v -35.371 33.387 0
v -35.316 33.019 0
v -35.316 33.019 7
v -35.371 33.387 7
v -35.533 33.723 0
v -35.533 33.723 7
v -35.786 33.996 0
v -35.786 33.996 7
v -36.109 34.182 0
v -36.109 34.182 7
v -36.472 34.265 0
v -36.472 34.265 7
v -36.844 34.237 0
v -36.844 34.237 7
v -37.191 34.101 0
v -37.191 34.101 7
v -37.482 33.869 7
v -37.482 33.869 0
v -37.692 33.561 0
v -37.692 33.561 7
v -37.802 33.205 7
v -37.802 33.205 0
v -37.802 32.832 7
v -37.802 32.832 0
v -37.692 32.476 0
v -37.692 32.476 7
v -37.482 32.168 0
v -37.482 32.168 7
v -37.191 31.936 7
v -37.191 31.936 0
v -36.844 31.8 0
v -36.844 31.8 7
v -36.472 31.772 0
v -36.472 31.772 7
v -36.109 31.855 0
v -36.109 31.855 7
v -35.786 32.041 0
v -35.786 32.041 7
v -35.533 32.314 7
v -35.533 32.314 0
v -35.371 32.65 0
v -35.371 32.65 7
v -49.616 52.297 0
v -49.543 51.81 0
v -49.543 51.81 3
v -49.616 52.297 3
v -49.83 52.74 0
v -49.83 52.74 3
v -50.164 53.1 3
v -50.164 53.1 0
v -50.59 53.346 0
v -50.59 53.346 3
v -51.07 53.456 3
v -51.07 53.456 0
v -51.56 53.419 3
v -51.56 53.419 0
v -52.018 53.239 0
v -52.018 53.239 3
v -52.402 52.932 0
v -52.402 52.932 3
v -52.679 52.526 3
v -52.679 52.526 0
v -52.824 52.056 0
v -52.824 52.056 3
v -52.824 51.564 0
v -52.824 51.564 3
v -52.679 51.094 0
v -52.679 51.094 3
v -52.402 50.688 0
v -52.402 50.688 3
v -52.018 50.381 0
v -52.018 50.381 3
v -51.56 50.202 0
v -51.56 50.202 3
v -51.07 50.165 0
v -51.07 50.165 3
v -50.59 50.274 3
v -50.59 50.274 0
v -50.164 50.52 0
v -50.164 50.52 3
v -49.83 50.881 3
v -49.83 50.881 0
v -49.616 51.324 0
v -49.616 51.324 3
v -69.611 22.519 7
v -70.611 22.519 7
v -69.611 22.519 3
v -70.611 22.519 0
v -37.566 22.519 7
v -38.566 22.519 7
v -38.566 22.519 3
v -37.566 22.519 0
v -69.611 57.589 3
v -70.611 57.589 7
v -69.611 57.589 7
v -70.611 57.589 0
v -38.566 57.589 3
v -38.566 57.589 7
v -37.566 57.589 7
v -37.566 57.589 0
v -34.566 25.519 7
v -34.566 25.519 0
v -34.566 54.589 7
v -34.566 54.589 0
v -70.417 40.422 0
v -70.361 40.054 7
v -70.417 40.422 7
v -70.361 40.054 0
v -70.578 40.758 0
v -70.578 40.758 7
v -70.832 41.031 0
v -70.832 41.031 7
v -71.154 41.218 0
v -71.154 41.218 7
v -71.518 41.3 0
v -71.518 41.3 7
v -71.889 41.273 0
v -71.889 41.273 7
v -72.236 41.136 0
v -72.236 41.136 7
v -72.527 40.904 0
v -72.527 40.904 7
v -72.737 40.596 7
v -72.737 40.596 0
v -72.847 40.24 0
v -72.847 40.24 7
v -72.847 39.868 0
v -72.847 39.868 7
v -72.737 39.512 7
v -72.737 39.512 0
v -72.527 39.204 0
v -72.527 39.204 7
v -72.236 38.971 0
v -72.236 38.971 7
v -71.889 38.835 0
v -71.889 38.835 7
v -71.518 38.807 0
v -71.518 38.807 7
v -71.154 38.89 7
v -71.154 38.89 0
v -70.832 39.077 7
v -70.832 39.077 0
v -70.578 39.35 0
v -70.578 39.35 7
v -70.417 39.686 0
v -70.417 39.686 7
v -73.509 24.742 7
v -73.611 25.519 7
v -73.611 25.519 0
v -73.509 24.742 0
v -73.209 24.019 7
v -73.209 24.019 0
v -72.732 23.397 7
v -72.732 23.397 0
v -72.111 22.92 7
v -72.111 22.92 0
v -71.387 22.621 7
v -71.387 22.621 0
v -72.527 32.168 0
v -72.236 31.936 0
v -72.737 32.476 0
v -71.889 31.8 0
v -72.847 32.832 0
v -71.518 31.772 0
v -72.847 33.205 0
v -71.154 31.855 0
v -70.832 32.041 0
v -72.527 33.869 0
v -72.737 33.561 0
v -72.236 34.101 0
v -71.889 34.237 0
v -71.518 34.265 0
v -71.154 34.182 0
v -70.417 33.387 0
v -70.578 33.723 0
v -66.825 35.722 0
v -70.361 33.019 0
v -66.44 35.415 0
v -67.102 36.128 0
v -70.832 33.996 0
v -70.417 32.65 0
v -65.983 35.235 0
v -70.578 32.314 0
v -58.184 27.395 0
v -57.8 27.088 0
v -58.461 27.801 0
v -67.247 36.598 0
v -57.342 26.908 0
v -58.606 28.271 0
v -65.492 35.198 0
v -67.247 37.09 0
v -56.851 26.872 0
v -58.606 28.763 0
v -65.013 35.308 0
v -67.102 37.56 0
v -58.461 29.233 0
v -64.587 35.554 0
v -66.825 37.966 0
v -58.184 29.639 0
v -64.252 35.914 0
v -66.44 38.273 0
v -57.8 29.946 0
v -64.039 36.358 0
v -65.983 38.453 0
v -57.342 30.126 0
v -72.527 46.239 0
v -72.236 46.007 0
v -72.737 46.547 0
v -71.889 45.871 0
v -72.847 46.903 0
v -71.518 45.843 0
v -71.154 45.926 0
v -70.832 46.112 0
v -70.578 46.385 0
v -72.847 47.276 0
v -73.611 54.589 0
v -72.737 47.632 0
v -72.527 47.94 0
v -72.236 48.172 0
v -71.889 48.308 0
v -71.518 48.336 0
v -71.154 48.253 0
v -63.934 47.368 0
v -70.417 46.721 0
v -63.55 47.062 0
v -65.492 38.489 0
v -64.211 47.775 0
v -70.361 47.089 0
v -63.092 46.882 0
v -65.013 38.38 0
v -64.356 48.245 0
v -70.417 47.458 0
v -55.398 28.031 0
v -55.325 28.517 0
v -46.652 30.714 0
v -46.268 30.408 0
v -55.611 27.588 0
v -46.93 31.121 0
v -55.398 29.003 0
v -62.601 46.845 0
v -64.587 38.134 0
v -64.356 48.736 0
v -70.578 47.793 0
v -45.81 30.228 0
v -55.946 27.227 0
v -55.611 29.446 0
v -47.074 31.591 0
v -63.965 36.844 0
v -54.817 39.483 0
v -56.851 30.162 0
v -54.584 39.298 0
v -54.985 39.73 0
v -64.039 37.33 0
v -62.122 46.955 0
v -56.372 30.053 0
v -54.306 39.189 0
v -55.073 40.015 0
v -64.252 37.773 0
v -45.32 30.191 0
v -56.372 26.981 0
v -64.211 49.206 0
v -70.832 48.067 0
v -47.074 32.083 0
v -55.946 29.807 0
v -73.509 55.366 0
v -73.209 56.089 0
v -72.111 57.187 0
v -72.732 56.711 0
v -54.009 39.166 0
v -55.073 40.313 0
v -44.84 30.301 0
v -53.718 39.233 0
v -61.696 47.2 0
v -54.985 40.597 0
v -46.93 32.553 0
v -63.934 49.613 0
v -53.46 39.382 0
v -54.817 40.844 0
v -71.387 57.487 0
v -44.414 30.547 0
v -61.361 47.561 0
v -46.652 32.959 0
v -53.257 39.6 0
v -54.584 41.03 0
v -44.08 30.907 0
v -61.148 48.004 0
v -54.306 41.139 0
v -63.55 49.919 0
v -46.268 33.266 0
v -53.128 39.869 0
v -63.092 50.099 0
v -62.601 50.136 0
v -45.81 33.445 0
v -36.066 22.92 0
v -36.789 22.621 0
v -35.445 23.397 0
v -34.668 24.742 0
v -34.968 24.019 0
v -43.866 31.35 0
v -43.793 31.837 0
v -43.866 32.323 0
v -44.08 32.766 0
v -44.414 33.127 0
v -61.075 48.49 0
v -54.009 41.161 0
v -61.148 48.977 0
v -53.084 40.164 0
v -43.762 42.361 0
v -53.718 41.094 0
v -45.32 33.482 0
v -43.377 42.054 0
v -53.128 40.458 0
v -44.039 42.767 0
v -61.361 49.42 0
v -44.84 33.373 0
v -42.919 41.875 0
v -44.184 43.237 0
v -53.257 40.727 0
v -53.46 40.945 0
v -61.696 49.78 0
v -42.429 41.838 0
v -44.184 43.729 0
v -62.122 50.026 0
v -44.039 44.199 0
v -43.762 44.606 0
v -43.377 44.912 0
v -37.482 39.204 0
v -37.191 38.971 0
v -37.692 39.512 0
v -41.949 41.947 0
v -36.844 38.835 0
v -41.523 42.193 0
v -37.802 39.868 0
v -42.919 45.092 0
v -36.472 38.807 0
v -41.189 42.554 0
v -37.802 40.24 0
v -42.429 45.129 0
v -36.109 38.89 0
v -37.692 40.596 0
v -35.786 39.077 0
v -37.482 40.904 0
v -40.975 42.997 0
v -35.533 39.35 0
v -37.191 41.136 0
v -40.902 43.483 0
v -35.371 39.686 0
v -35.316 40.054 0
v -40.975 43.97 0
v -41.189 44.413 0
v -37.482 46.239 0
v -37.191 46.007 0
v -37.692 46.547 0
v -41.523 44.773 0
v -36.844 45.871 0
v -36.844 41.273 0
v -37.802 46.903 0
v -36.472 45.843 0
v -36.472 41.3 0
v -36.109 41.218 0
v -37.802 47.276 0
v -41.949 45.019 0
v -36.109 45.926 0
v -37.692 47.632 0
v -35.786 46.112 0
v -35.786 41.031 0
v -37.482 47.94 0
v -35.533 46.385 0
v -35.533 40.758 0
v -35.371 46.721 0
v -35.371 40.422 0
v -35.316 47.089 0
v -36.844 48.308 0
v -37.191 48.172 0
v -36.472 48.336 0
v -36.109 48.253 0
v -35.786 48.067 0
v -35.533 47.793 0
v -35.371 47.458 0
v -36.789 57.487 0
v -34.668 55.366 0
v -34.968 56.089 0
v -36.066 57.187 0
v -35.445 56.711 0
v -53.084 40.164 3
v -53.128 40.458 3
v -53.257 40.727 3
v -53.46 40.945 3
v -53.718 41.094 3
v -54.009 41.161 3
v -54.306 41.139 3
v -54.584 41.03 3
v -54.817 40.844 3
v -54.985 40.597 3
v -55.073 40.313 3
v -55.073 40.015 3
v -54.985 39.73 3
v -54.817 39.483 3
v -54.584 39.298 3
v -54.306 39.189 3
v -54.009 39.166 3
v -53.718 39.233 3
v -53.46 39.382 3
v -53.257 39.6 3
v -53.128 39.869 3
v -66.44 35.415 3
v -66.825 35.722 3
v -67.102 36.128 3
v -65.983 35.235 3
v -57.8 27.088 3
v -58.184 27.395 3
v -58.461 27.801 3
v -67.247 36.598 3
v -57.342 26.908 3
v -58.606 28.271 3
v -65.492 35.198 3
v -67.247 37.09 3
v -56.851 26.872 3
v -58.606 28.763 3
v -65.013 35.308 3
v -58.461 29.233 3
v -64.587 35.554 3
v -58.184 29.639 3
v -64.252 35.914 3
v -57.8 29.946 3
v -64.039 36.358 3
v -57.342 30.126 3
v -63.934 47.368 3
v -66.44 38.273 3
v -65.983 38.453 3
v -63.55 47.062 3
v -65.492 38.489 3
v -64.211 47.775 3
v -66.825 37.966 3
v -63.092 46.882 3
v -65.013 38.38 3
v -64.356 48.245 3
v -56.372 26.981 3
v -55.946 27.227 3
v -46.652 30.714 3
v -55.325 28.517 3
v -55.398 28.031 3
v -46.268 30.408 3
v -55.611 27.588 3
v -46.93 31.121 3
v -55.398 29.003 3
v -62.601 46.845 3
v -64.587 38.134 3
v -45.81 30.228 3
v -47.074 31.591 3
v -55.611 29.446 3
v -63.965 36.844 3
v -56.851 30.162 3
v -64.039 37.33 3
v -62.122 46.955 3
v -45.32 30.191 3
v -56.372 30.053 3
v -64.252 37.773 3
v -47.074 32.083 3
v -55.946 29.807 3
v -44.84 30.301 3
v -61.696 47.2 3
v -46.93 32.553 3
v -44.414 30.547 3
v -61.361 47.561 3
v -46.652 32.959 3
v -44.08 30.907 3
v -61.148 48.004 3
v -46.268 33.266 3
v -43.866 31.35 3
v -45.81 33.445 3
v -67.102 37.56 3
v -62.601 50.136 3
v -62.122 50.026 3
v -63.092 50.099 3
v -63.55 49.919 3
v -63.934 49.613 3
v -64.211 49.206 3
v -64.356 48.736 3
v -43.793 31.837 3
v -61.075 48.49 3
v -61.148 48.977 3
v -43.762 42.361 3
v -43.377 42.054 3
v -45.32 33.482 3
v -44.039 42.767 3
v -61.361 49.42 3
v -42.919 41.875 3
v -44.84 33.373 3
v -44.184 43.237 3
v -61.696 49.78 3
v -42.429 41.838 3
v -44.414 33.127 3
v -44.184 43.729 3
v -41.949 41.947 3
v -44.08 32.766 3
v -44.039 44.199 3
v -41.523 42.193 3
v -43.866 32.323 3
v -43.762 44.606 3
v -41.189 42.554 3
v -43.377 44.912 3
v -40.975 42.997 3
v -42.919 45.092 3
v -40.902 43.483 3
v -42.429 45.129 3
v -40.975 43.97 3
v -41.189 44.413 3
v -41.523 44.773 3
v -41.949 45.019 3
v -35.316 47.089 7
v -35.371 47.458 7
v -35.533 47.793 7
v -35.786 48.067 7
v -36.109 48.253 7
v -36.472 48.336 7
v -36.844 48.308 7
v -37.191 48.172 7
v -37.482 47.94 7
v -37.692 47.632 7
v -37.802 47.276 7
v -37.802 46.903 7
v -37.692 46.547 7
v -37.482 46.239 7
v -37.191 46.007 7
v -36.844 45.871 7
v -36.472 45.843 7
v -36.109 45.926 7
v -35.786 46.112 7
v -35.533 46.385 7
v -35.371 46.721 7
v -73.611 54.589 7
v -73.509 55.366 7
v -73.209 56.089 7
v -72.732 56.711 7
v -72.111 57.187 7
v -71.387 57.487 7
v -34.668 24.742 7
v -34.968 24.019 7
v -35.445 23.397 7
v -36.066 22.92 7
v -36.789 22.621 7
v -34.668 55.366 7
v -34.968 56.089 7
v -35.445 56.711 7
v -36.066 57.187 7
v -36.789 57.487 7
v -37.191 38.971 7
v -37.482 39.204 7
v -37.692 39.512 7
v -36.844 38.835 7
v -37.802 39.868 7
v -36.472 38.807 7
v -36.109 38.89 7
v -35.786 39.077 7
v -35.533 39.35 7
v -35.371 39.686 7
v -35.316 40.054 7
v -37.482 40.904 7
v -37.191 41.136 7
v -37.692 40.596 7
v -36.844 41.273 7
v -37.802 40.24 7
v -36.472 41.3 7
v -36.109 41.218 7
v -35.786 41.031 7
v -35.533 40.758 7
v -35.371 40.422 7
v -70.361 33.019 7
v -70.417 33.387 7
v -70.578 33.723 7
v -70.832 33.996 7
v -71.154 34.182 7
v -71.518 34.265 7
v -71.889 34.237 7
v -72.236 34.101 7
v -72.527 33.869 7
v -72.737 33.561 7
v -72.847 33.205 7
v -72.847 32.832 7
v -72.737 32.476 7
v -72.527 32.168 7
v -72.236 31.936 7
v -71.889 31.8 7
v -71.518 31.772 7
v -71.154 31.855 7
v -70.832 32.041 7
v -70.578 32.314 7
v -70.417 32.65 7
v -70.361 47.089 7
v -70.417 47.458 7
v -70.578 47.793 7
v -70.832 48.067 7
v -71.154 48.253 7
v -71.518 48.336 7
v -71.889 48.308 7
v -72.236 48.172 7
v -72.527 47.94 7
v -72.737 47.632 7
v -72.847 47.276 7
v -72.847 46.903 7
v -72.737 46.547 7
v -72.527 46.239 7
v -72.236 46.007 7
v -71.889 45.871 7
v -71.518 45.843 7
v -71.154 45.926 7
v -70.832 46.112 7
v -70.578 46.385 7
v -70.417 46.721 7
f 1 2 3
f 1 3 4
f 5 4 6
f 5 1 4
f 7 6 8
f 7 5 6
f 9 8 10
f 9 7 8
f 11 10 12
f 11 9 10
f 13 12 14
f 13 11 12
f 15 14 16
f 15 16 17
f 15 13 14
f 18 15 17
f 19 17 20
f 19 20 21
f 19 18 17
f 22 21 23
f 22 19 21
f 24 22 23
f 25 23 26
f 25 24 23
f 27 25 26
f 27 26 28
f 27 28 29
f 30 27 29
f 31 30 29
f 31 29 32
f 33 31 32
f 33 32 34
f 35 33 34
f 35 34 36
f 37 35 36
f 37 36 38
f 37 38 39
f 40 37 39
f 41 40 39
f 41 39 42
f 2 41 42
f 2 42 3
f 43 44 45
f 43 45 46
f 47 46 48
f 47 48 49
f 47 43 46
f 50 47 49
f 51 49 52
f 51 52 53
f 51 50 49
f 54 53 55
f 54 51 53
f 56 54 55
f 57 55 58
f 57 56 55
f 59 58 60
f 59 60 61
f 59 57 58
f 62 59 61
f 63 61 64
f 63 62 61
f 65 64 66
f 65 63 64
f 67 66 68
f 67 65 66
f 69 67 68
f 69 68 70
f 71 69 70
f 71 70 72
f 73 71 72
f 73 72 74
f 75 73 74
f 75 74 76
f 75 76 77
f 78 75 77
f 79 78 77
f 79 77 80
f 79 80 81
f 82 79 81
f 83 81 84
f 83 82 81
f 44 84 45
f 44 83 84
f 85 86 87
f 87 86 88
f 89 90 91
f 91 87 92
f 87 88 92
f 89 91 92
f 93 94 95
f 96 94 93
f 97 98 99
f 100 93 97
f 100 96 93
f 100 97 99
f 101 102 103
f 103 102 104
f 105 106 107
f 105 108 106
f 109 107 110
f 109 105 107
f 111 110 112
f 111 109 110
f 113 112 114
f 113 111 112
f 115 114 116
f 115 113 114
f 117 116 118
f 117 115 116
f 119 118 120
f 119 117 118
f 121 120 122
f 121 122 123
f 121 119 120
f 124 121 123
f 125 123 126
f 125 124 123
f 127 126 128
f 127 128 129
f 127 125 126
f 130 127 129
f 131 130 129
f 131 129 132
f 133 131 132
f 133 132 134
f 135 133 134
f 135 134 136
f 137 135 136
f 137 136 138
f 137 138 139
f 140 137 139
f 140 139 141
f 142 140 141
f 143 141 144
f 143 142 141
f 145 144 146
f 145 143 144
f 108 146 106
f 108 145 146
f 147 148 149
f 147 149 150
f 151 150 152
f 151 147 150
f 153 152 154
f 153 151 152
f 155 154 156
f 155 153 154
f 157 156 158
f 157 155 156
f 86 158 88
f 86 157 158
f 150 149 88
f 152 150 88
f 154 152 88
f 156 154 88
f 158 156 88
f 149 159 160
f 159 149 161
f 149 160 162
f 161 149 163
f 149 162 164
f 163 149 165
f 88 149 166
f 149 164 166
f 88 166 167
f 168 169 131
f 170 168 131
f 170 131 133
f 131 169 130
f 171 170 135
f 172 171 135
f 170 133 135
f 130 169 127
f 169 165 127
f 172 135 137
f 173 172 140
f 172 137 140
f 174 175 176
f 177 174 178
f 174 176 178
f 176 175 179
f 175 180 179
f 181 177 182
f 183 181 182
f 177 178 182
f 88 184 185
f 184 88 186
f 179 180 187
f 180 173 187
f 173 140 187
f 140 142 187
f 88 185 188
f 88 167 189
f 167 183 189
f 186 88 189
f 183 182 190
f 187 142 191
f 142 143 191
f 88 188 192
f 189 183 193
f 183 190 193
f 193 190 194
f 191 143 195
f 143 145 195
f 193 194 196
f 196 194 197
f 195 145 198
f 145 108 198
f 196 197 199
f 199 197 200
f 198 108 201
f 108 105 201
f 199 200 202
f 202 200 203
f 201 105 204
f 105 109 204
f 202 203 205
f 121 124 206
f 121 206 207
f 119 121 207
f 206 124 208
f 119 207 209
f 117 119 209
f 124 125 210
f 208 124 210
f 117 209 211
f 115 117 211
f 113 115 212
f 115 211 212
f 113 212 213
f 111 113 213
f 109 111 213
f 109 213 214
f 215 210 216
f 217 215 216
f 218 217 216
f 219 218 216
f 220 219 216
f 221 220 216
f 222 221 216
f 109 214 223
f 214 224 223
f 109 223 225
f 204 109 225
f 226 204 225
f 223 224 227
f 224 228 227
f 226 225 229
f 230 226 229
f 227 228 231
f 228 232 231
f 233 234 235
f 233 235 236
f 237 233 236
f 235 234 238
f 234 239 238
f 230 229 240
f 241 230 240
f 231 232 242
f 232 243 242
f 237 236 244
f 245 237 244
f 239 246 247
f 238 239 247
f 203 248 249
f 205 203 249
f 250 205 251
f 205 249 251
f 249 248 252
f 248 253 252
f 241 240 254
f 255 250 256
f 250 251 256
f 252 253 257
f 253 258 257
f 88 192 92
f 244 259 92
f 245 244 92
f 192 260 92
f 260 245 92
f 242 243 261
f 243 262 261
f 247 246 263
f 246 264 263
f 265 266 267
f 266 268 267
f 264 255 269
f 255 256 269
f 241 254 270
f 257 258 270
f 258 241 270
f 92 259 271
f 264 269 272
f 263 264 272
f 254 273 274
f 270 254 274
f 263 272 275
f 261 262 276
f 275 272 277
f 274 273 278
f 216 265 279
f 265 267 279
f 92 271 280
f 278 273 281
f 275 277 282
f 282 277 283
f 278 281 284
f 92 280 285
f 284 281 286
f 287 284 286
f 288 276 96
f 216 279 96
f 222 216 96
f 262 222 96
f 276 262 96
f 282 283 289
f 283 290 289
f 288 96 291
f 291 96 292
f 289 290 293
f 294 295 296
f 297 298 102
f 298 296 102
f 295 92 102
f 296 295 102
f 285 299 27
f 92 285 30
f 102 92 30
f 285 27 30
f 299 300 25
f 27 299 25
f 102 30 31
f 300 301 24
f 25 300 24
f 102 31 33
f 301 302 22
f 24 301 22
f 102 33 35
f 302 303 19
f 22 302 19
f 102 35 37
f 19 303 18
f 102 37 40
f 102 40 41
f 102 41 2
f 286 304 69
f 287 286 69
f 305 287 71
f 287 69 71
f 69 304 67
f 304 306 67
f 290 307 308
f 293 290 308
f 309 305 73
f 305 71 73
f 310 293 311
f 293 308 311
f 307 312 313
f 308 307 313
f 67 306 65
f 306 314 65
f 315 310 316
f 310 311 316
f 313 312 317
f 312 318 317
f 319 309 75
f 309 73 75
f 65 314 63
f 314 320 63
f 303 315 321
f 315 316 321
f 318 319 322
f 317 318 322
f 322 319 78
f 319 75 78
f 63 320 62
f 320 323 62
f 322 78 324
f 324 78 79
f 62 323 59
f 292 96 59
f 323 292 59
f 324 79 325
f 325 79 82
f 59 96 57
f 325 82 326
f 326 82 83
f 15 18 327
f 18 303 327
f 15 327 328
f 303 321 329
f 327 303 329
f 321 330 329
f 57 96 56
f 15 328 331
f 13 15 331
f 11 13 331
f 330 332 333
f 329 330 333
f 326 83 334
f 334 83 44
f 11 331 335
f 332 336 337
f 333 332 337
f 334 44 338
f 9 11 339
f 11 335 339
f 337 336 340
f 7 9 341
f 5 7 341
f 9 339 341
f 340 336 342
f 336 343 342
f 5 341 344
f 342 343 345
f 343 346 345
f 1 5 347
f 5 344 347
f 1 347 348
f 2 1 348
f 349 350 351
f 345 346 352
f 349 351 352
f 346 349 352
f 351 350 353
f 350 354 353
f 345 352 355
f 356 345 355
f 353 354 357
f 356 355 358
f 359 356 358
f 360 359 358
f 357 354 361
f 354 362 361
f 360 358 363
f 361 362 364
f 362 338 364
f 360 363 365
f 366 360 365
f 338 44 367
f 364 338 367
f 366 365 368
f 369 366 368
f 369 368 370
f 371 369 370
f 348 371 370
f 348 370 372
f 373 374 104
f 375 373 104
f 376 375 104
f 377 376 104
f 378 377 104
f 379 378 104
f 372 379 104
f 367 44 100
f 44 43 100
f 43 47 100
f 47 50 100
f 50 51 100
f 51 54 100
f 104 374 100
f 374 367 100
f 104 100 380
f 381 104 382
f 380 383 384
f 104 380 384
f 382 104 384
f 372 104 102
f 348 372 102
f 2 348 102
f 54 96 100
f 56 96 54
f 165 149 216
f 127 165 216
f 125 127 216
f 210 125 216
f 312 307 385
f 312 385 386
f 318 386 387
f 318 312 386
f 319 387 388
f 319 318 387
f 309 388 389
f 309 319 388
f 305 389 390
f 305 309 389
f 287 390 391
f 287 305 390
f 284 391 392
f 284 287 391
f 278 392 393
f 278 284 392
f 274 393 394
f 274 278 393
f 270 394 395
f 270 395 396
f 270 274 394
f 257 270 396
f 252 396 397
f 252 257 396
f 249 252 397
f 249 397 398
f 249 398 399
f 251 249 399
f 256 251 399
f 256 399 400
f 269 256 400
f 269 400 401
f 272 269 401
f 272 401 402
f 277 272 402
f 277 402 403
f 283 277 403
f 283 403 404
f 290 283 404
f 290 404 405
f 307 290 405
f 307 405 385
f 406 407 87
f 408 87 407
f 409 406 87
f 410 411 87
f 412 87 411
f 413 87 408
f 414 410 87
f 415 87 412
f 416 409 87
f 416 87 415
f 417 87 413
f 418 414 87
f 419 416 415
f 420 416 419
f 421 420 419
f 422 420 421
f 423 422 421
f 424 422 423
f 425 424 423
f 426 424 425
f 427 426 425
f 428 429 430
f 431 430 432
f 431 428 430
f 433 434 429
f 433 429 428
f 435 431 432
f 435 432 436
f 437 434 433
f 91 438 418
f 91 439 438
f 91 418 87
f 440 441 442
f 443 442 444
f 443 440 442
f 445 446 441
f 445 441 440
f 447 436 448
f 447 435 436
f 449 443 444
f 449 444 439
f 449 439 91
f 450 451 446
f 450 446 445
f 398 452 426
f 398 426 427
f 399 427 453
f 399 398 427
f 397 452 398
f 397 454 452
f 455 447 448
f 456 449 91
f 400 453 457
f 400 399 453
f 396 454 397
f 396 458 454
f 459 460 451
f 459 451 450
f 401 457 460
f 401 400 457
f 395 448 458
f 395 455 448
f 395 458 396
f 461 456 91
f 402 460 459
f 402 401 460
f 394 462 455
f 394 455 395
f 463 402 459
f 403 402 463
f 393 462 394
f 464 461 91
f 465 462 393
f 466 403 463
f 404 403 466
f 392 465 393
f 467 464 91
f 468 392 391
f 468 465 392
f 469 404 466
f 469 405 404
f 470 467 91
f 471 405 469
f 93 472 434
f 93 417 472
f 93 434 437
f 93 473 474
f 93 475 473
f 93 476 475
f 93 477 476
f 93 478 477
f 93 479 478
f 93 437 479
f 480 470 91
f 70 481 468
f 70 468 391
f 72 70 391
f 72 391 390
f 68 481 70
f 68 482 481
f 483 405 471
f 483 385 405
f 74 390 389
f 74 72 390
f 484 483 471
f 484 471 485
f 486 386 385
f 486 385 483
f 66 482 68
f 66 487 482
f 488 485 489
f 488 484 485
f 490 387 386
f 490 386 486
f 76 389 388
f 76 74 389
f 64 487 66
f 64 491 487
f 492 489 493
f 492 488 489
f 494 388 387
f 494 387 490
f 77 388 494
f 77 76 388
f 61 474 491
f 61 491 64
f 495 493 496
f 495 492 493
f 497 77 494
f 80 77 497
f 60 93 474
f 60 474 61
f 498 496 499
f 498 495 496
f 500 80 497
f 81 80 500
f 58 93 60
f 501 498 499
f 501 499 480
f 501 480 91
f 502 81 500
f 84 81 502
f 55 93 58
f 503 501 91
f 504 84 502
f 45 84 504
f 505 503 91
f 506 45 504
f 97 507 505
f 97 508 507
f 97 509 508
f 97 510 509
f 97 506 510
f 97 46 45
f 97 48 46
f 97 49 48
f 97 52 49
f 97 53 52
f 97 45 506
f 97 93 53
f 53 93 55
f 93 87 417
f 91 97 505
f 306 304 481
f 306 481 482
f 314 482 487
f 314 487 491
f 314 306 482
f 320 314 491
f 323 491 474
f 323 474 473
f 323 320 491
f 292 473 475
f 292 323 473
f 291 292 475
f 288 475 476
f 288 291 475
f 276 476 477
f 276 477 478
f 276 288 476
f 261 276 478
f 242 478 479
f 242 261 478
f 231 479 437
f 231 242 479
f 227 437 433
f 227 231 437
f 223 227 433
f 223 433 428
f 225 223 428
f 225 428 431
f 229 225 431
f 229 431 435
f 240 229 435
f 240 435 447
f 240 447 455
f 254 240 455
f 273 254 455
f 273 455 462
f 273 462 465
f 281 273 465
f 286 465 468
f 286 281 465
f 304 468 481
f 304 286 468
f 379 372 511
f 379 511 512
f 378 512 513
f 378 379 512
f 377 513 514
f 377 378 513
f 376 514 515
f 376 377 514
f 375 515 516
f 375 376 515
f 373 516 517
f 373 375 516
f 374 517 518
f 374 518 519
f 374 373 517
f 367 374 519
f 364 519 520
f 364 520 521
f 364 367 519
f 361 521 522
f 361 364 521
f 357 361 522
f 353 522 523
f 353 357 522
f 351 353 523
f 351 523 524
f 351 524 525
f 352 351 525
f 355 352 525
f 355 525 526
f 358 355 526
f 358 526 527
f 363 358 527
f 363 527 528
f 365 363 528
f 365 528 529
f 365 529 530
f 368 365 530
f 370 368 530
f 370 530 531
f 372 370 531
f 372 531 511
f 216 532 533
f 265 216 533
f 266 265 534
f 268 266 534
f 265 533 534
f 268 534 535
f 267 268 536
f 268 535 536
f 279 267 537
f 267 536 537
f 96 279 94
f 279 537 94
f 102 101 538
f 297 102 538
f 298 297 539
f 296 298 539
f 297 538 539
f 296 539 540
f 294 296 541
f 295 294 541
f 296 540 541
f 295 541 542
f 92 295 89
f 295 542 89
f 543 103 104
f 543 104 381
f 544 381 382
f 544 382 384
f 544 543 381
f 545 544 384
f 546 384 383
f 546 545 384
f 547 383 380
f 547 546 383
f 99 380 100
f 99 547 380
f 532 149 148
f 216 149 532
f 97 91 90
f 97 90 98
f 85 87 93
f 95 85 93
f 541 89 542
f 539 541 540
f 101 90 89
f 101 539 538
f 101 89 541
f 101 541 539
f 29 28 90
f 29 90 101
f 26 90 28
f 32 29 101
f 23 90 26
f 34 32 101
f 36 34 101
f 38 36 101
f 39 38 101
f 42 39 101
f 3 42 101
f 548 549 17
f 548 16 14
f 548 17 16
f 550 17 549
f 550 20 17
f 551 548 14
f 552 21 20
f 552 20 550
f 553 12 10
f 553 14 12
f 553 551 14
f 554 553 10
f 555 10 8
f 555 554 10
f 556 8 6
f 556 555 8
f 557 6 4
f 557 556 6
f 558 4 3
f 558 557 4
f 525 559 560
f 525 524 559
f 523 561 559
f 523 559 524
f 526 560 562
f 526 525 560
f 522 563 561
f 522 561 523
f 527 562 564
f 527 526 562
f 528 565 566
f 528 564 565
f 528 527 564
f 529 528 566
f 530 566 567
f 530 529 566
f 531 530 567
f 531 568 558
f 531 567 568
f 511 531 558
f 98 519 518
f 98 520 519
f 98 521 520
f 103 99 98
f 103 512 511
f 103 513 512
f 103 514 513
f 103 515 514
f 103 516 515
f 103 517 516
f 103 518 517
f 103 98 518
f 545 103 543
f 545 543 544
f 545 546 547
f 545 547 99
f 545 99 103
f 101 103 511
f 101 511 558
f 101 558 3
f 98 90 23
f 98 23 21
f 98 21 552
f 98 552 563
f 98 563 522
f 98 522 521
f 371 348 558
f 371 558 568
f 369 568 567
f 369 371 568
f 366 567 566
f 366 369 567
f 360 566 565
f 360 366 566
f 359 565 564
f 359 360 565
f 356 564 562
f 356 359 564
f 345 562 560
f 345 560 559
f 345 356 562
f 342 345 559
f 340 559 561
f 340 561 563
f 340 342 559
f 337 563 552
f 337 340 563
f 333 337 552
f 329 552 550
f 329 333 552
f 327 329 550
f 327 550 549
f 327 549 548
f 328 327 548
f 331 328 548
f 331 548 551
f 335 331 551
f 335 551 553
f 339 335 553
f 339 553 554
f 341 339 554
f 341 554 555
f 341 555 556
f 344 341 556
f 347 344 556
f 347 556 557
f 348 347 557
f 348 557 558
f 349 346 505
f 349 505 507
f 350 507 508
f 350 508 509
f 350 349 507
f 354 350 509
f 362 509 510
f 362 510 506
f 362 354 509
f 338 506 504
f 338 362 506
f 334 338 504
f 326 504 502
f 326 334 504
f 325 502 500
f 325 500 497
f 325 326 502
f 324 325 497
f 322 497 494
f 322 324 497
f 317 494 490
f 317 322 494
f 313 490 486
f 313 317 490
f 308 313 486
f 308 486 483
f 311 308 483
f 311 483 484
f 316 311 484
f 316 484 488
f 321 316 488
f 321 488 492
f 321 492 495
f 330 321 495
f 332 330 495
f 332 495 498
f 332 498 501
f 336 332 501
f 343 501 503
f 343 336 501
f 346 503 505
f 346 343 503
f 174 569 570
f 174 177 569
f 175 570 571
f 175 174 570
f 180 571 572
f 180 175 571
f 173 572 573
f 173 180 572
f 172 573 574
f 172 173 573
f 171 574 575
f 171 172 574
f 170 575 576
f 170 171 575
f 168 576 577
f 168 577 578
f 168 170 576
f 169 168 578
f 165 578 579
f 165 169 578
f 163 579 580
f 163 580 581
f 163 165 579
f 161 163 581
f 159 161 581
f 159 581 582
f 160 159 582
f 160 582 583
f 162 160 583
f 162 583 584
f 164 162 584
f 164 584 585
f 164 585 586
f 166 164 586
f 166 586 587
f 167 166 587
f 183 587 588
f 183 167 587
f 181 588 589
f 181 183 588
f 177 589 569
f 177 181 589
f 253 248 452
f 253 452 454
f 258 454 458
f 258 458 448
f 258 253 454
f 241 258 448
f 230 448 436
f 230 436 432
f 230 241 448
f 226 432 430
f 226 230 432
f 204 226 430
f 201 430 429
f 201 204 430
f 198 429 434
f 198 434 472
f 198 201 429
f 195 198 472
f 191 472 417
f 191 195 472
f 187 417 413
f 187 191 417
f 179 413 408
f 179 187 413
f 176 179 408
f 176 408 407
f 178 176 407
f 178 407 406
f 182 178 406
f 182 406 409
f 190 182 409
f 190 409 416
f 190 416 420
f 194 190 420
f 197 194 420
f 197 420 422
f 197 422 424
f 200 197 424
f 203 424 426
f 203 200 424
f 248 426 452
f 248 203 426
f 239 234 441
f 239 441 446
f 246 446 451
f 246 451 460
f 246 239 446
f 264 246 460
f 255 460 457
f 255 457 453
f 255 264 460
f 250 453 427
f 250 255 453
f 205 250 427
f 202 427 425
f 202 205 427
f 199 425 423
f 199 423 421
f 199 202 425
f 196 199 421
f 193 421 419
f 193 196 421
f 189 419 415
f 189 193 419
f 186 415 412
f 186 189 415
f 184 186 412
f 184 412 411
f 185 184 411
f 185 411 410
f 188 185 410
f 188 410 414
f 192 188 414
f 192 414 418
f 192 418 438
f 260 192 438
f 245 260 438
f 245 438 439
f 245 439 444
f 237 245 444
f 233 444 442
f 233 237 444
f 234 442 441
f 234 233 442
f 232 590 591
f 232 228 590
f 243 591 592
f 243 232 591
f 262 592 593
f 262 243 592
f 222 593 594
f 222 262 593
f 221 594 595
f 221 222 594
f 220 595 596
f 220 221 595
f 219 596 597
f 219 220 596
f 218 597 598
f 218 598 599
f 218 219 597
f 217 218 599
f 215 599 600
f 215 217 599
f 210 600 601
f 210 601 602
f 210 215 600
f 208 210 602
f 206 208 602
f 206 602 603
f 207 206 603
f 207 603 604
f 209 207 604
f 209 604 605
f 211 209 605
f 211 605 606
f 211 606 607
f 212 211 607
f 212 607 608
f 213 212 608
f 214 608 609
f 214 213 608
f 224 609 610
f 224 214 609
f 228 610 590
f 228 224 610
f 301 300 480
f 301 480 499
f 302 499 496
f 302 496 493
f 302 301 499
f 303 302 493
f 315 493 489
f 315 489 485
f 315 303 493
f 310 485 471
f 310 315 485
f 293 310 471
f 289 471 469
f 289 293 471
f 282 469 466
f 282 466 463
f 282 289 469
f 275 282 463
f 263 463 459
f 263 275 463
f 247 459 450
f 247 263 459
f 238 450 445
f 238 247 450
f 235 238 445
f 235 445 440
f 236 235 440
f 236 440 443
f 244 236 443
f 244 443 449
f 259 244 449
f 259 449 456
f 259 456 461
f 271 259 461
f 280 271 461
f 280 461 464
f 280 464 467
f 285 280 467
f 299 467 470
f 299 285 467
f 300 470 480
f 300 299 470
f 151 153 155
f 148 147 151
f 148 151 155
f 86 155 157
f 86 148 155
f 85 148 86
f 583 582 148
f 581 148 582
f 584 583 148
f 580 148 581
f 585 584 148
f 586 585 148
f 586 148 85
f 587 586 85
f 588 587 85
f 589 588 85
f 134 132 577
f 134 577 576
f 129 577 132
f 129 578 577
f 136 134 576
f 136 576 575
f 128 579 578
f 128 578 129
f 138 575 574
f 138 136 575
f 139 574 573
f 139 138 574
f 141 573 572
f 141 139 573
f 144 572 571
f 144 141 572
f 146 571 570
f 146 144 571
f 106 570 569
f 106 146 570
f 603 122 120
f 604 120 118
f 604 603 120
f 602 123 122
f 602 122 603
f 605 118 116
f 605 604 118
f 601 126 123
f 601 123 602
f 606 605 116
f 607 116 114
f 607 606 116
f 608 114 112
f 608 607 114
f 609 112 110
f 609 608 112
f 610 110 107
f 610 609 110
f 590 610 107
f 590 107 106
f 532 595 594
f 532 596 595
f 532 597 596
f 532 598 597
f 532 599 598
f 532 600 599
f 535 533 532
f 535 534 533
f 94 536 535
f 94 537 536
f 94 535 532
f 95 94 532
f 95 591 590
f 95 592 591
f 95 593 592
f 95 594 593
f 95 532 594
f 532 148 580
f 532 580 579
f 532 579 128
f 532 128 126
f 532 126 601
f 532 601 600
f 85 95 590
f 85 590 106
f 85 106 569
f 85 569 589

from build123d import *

# Parameters (mm, degrees)
SKETCH_3_R          = 1.65
EXTRUDE_2_DEPTH     = 3
SKETCH_4_W          = 4
SKETCH_4_H          = 35.070805957
SKETCH_4_R          = 1.25
EXTRUDE_3_DEPTH     = 4
CUT_EXTRUDE_START   = -10
SKETCH_5_R          = 1
SKETCH_5_R_2        = 1.25
CUT_EXTRUDE_1_DEPTH = 10
FILLET_1_R          = 3
FILLET_2_R          = 3
FILLET_3_R          = 3
FILLET_4_R          = 3


with BuildPart() as part:
    # 草图3 → 凸台-拉伸2 (new body)
    with BuildSketch(Plane.XY):
        Polygon((-35.565841924, 57.58934902), (-72.610989278, 57.58934902), (-73.610989278, 57.58934902), (-73.610989278, 22.518543063), (-72.610989278, 22.518543063), (-35.565841924, 22.518543063), (-34.565841924, 22.518543063), (-34.565841924, 57.58934902), align=None)
        with Locations((-56.974581146, 28.517016942)):
            Circle(SKETCH_3_R, mode=Mode.SUBTRACT)
        with Locations((-65.61538335, 36.843873328)):
            Circle(SKETCH_3_R, mode=Mode.SUBTRACT)
        with Locations((-45.44291088, 31.836742967)):
            Circle(SKETCH_3_R, mode=Mode.SUBTRACT)
        with Locations((-62.724515288, 48.490455739)):
            Circle(SKETCH_3_R, mode=Mode.SUBTRACT)
        with Locations((-42.552042818, 43.483325377)):
            Circle(SKETCH_3_R, mode=Mode.SUBTRACT)
        with Locations((-51.192845022, 51.810181763)):
            Circle(SKETCH_3_R, mode=Mode.SUBTRACT)
    extrude(amount=EXTRUDE_2_DEPTH)

    # 草图4 → 凸台-拉伸3 (add)
    # profile 1 of 2: a face of its own
    with BuildSketch(Plane.XY.offset(3)):
        with Locations((-71.610989278, 40.053946041)):
            Rectangle(SKETCH_4_W, SKETCH_4_H)
        with Locations((-71.610989278, 47.08934902)):
            Circle(SKETCH_4_R, mode=Mode.SUBTRACT)
        with Locations((-71.610989278, 33.018543063)):
            Circle(SKETCH_4_R, mode=Mode.SUBTRACT)
        with Locations((-71.610989278, 40.053946042)):
            Circle(SKETCH_4_R, mode=Mode.SUBTRACT)
    # profile 2 of 2: a face of its own
    with BuildSketch(Plane.XY.offset(3)):
        with Locations((-36.565841924, 40.053946041)):
            Rectangle(SKETCH_4_W, SKETCH_4_H)
        with Locations((-36.565841924, 47.08934902)):
            Circle(SKETCH_4_R, mode=Mode.SUBTRACT)
        with Locations((-36.565841924, 40.053946042)):
            Circle(SKETCH_4_R, mode=Mode.SUBTRACT)
        with Locations((-36.565841924, 33.018543063)):
            Circle(SKETCH_4_R, mode=Mode.SUBTRACT)
    extrude(amount=EXTRUDE_3_DEPTH)

    # 草图5 → 切除-拉伸1 (cut)
    with BuildSketch(Plane.XY.offset(3).offset(CUT_EXTRUDE_START)):
        with Locations((-54.083713084, 40.163599353)):
            Circle(SKETCH_5_R)
        with Locations((-71.610989278, 47.08934902)):
            Circle(SKETCH_5_R_2)
        with Locations((-71.610989278, 40.053946042)):
            Circle(SKETCH_5_R_2)
        with Locations((-71.610989278, 33.018543063)):
            Circle(SKETCH_5_R_2)
        with Locations((-36.565841924, 47.08934902)):
            Circle(SKETCH_5_R_2)
        with Locations((-36.565841924, 40.053946042)):
            Circle(SKETCH_5_R_2)
        with Locations((-36.565841924, 33.018543063)):
            Circle(SKETCH_5_R_2)
    extrude(amount=CUT_EXTRUDE_1_DEPTH, mode=Mode.SUBTRACT)

    # 圆角1
    fillet_1_edges = [part.edges().sort_by_distance(p)[0] for p in [
        (-73.610989278, 22.518543063, 3.5),
    ]]
    fillet(fillet_1_edges, radius=FILLET_1_R)

    # 圆角2
    fillet_2_edges = [part.edges().sort_by_distance(p)[0] for p in [
        (-73.610989278, 57.58934902, 3.5),
    ]]
    fillet(fillet_2_edges, radius=FILLET_2_R)

    # 圆角3
    fillet_3_edges = [part.edges().sort_by_distance(p)[0] for p in [
        (-34.565841924, 57.58934902, 3.5),
    ]]
    fillet(fillet_3_edges, radius=FILLET_3_R)

    # 圆角4
    fillet_4_edges = [part.edges().sort_by_distance(p)[0] for p in [
        (-34.565841924, 22.518543063, 3.5),
    ]]
    fillet(fillet_4_edges, radius=FILLET_4_R)


solid = part.part
